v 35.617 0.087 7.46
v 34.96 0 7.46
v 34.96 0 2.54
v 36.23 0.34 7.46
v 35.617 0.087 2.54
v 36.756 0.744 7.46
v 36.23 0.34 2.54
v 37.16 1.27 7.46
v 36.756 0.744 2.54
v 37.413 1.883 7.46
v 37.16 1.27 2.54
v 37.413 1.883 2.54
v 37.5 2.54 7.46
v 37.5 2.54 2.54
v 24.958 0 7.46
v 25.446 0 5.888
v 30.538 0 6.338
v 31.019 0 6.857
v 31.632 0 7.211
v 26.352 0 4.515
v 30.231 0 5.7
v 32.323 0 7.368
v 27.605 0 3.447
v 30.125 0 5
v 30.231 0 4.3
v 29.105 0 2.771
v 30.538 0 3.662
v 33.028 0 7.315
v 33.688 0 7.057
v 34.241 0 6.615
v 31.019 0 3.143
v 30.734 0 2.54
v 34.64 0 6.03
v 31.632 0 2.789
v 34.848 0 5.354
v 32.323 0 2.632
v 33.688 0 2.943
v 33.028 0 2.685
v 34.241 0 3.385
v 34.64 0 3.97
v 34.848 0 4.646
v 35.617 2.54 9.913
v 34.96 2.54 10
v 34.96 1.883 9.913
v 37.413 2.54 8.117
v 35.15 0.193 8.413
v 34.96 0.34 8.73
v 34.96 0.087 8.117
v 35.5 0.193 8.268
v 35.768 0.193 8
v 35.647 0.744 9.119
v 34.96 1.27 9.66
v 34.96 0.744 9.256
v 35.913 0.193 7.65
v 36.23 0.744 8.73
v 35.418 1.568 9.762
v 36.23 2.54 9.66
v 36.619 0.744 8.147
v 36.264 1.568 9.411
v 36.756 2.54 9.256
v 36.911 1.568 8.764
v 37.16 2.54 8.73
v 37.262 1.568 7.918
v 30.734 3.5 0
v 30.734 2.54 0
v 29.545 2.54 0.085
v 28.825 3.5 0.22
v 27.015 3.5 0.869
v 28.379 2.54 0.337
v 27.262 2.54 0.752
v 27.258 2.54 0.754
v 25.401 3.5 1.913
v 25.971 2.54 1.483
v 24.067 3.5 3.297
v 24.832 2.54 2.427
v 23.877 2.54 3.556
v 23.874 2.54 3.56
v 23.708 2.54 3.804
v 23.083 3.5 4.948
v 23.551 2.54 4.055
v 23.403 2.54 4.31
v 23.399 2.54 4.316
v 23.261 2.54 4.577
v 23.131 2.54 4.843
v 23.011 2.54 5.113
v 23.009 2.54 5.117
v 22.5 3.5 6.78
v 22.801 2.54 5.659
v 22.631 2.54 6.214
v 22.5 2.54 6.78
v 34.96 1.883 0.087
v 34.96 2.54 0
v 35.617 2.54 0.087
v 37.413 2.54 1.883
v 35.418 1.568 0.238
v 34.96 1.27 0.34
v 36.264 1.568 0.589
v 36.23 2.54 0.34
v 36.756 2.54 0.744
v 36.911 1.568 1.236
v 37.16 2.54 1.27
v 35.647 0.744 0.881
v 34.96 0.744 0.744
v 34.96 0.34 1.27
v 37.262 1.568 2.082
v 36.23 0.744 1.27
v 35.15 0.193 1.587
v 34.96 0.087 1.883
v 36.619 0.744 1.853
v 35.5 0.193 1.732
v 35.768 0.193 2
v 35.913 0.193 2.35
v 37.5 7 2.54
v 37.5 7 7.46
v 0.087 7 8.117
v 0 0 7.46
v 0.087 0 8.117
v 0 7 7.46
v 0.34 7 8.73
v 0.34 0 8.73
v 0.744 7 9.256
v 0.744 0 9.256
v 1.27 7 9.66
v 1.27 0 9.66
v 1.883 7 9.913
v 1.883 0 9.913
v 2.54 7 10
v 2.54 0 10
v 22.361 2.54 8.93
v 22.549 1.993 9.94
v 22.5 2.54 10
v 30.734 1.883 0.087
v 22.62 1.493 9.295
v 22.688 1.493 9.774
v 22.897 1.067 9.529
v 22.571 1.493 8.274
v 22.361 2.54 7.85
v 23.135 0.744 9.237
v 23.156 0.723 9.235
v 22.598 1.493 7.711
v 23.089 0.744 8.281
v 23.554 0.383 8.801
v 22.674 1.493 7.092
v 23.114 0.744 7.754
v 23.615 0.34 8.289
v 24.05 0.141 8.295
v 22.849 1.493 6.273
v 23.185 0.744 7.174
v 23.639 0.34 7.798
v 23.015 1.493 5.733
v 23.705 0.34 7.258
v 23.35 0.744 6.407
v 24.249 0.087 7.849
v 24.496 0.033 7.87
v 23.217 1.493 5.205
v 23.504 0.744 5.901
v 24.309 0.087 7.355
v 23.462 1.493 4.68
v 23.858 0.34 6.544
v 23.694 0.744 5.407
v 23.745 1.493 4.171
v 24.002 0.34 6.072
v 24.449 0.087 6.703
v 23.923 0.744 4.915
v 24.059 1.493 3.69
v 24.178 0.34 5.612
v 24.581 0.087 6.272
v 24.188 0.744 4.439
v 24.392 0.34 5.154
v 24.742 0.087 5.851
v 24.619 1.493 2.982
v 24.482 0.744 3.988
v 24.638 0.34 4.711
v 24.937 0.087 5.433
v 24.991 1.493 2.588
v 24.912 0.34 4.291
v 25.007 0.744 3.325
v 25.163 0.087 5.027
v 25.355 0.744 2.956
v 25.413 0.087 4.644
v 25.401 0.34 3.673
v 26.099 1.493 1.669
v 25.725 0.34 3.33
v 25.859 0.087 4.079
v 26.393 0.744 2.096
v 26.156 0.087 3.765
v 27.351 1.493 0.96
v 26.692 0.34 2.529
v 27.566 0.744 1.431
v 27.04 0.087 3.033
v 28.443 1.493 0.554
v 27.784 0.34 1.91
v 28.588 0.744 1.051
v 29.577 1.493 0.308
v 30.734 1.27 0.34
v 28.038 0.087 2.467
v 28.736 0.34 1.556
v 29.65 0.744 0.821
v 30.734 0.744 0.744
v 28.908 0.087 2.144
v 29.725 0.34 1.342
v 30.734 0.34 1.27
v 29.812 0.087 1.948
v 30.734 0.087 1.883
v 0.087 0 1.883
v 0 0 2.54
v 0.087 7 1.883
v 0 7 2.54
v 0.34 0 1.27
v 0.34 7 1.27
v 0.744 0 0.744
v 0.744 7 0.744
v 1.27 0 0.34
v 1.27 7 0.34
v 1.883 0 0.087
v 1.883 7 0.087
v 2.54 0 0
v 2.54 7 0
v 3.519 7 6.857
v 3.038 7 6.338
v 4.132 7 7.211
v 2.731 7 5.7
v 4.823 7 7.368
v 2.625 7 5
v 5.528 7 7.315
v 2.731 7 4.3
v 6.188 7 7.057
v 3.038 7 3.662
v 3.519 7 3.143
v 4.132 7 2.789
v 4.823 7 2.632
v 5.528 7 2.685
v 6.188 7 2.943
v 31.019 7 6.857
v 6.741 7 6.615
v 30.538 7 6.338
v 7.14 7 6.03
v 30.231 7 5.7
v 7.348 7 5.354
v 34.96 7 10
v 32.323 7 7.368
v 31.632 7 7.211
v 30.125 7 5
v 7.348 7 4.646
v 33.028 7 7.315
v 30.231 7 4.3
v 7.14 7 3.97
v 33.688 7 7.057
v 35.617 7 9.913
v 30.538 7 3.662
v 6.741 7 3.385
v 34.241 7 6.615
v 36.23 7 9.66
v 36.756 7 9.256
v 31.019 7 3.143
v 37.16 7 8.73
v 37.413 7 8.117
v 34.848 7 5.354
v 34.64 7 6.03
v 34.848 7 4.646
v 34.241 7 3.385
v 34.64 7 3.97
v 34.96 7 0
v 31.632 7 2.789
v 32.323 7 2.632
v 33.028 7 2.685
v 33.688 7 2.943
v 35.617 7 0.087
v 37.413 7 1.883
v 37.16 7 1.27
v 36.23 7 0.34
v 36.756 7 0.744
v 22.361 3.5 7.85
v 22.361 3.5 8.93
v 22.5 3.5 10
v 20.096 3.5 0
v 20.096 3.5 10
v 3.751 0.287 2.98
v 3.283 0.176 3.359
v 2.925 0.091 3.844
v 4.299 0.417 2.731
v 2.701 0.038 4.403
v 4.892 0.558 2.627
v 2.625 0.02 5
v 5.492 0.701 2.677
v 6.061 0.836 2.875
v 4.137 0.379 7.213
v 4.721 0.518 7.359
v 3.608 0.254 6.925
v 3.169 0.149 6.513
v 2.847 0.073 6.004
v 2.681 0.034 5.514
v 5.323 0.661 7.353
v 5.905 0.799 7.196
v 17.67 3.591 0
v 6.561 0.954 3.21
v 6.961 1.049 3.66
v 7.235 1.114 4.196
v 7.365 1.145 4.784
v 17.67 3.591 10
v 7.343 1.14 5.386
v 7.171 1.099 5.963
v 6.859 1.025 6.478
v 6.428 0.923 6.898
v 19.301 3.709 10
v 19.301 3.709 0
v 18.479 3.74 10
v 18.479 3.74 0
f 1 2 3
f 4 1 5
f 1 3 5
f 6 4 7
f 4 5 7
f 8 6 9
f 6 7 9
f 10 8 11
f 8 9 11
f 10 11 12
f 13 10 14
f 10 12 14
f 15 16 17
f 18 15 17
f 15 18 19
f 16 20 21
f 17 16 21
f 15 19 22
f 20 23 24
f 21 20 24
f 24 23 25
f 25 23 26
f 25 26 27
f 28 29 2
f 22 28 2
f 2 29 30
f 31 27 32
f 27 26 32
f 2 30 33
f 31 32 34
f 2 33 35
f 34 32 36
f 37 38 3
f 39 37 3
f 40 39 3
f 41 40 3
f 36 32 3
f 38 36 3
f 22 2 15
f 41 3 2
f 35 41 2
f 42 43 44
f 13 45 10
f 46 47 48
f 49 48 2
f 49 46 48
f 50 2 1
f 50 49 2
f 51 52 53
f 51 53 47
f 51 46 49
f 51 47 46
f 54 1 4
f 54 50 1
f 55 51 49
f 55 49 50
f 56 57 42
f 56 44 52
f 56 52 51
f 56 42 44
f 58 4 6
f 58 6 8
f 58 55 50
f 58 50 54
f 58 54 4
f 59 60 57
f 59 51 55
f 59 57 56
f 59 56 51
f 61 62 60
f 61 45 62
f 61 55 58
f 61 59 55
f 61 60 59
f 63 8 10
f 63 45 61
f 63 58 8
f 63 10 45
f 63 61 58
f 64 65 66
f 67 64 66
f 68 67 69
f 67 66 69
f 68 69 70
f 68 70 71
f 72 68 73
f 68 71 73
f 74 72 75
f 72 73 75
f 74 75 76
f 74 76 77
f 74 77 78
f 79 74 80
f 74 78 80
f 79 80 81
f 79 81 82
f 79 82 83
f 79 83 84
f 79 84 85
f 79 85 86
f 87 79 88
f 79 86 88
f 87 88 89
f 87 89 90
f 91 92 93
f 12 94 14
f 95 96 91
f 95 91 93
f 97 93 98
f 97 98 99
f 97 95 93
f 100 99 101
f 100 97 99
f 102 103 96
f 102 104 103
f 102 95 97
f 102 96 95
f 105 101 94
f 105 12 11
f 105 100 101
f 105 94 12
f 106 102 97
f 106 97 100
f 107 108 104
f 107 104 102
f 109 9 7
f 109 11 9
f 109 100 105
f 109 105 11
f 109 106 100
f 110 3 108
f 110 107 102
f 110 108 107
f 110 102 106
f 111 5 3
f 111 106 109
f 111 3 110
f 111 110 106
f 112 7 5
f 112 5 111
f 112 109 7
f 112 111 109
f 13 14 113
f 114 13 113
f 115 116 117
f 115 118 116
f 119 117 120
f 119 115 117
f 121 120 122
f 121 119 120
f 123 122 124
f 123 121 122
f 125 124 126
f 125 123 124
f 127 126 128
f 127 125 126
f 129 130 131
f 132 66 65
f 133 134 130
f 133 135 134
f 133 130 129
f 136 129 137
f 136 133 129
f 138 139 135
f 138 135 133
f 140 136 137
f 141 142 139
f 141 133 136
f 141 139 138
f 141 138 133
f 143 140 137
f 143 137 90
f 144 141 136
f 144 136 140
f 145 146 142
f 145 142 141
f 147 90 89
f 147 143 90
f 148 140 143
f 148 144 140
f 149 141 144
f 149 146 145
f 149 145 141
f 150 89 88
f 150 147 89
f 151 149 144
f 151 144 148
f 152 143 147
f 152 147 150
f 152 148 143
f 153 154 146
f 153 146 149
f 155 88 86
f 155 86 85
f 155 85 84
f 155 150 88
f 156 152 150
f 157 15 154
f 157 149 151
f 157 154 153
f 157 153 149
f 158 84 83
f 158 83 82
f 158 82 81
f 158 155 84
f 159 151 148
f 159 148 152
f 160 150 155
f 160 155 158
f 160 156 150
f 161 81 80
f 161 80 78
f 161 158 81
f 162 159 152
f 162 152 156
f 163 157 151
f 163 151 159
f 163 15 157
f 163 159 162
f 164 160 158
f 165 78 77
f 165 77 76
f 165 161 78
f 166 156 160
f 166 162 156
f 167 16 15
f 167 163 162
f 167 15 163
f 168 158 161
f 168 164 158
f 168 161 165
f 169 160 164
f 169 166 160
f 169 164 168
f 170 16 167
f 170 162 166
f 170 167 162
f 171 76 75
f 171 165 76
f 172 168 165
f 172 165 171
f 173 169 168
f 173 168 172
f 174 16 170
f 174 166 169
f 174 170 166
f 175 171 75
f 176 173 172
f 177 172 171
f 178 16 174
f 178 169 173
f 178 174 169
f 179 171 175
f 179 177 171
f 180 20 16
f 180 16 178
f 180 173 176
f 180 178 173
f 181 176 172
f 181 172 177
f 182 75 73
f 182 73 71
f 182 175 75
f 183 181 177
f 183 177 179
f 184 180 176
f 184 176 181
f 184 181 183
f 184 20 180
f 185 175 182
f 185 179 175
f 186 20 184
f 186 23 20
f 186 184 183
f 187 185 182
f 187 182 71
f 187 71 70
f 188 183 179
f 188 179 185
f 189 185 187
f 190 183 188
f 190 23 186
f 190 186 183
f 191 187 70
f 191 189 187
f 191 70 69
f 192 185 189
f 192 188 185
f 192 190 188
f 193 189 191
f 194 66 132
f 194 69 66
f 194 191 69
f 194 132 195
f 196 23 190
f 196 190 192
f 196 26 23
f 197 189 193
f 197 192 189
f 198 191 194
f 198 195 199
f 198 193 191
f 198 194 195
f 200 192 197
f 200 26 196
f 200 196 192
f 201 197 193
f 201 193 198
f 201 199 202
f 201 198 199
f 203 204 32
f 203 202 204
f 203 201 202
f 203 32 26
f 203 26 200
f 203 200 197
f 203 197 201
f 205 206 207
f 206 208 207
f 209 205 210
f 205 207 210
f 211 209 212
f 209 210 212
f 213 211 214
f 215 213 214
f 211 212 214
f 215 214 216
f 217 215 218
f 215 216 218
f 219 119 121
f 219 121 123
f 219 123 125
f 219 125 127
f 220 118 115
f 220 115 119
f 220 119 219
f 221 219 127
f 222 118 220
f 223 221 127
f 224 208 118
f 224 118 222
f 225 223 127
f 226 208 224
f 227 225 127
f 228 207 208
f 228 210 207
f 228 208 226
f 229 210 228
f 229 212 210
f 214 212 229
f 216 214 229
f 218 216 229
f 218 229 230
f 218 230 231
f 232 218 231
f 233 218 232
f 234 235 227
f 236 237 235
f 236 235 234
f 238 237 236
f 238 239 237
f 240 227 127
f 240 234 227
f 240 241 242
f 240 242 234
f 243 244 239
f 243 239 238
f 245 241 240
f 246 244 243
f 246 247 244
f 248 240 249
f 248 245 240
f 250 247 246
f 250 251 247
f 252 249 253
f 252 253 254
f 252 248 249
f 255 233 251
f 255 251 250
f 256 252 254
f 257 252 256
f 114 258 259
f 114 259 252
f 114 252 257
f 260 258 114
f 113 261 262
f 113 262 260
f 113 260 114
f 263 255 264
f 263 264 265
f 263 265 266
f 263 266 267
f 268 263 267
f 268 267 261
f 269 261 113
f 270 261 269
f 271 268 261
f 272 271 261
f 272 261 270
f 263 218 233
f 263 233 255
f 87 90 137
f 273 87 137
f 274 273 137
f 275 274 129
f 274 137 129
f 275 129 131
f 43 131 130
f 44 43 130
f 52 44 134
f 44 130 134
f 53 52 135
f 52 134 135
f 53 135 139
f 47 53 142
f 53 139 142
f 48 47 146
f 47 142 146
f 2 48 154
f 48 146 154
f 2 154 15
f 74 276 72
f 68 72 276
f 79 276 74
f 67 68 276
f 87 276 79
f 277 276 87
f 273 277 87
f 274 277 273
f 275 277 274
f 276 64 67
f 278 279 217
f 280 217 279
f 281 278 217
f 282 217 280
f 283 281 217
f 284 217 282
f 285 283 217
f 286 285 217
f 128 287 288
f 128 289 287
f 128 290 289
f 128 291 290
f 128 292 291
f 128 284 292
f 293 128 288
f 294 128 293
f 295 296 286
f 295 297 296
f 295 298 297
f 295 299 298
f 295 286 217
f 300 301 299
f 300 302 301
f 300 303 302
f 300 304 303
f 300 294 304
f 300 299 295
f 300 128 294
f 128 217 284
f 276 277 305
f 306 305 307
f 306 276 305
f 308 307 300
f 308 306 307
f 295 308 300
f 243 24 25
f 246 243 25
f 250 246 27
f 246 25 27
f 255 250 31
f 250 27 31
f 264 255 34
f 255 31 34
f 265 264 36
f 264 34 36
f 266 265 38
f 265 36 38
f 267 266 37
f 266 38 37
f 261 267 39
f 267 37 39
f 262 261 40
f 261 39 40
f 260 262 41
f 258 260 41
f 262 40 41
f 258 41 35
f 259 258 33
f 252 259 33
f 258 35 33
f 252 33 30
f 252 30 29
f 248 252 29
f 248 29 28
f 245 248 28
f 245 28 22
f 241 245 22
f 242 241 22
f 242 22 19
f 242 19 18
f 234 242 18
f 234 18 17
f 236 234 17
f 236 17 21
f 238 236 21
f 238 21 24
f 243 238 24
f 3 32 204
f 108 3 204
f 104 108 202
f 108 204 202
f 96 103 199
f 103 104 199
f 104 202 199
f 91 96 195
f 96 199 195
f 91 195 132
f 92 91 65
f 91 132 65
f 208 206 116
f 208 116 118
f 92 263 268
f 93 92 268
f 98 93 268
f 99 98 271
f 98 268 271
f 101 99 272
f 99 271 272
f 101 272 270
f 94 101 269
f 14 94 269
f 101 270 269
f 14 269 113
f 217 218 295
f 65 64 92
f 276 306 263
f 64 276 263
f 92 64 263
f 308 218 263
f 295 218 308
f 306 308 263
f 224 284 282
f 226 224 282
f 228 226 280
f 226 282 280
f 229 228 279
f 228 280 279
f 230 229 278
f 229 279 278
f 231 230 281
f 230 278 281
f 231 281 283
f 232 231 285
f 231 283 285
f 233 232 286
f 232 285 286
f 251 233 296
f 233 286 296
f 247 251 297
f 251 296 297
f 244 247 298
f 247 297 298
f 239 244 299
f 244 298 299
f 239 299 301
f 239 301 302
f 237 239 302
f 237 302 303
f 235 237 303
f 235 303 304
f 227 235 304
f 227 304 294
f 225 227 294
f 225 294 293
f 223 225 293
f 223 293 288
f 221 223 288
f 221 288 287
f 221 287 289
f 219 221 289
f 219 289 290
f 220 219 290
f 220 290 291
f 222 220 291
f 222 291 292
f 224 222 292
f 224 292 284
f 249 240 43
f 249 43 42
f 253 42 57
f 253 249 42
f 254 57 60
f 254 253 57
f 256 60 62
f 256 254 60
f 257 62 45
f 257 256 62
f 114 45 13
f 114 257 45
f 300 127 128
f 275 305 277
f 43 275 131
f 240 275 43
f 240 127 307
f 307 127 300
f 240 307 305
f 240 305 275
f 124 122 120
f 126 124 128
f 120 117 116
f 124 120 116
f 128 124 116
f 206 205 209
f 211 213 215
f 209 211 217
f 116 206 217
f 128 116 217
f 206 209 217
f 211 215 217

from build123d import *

# Parameters (mm, degrees)
SKETCH1_W               = 37.5
SKETCH1_H               = 7
BOSS_EXTRUDE1_DEPTH     = 10
CUT_EXTRUDE1_DEPTH      = 40.436658073
CUT_EXTRUDE1_DEPTH_BACK = 40.436658073
SKETCH2_R               = 3.75
FILLET1_R               = 2.54
F_4_0MM_DOWEL_HOLE1_D   = 4.75
CUT_EXTRUDE2_DEPTH      = 40.436658073
CUT_EXTRUDE2_DEPTH_BACK = 40.436658073
CUT_EXTRUDE3_DEPTH      = 3.5
FILLET2_R               = 2.54


with BuildPart() as part:
    # Sketch1 → Boss-Extrude1 (new body)
    with BuildSketch(Plane.XY):
        with Locations((18.75, 3.5)):
            Rectangle(SKETCH1_W, SKETCH1_H)
    extrude(amount=BOSS_EXTRUDE1_DEPTH)

    # Sketch2 → Cut-Extrude1 (cut, two sides: drawn at the far end of the back side and taken through both)
    with BuildSketch(Plane.XY.offset(10).offset(-CUT_EXTRUDE1_DEPTH_BACK)):
        with Locations((18.75, 0)):
            Circle(SKETCH2_R)
    extrude(amount=CUT_EXTRUDE1_DEPTH + CUT_EXTRUDE1_DEPTH_BACK, mode=Mode.SUBTRACT)

    # Fillet1
    fillet1_edges = [part.edges().sort_by_distance(p)[0] for p in [
        (37.5, 3.5, 10),
        (0, 3.5, 10),
        (37.5, 3.5, 0),
        (0, 3.5, 0),
    ]]
    fillet(fillet1_edges, radius=FILLET1_R)

    # Ø4.0mm Dowel Hole1 (through all)
    with Locations(Plane(origin=(0, 7, 0), x_dir=(1, 0, 0), z_dir=(0, 1, 0))):
        with Locations((5, -5), (32.5, -5)):
            Hole(F_4_0MM_DOWEL_HOLE1_D / 2)

    # Sketch6 → Cut-Extrude2 (cut, two sides: drawn at the far end of the back side and taken through both)
    with BuildSketch(Plane(origin=(0, 0, 0), x_dir=(-1, 0, 0), z_dir=(0, 0, -1)).offset(-CUT_EXTRUDE2_DEPTH_BACK)):
        Polygon((-2.54, 0), (-18.100943668, 3.693403021), (-18.100943668, 0), align=None)
    extrude(amount=CUT_EXTRUDE2_DEPTH + CUT_EXTRUDE2_DEPTH_BACK, mode=Mode.SUBTRACT)

    # Sketch7 → Cut-Extrude3 (cut)
    with BuildSketch(Plane.XZ):
        with BuildLine():
            Line((22.5, 6.78008281), (22.5, 0))
            Line((22.5, 0), (30.734125825, 0))
            ThreePointArc((30.734125825, 0), (25.400966559, 1.913143457), (22.5, 6.78008281))
        make_face()
        with BuildLine():
            Line((22.5, 10), (20.085032716, 10))
            Line((20.085032716, 10), (20.085032716, 0))
            Line((20.085032716, 0), (22.5, 0))
            Line((22.5, 0), (22.5, 6.78008281))
            ThreePointArc((22.5, 6.78008281), (22.34408442, 8.390041405), (22.5, 10))
        make_face()
    extrude(amount=-CUT_EXTRUDE3_DEPTH, mode=Mode.SUBTRACT)

    # Fillet2
    # the kernel refuses this fillet: 2.54 mm, written as the material it takes off along each edge
    with BuildSketch(Plane(origin=(16.15, 0, 10), x_dir=(0, 1, 0), z_dir=(1, 0, 0))) as fillet2_piece_1:
        with BuildLine():
            CenterArc((FILLET2_R, -FILLET2_R), FILLET2_R, 90, 90)
            Line((0, -FILLET2_R), (0, 0))
            Line((0, 0), (FILLET2_R, 0))
        make_face()
    extrude(amount=18.81, mode=Mode.SUBTRACT)
    with BuildSketch(Plane(origin=(34.96, 0, 7.46), x_dir=(0, 0, 1), z_dir=(-1, 0, 0))) as fillet2_piece_2:
        with BuildLine():
            CenterArc((2.54 - FILLET2_R, FILLET2_R), FILLET2_R, 270, 90)
            Line((2.54 - FILLET2_R, 0), (2.54, 0))
            Line((2.54, 0), (2.54, FILLET2_R))
        make_face()
    revolve(axis=Axis((34.96, 0, 7.46), (0, 1, 0)), revolution_arc=90, mode=Mode.SUBTRACT)
    with BuildSketch(Plane(origin=(37.5, 0, 2.54), x_dir=(-1, 0, 0), z_dir=(0, 0, 1))) as fillet2_piece_3:
        with BuildLine():
            CenterArc((FILLET2_R, -FILLET2_R), FILLET2_R, 90, 90)
            Line((0, -FILLET2_R), (0, 0))
            Line((0, 0), (FILLET2_R, 0))
        make_face()
    extrude(amount=4.92, mode=Mode.SUBTRACT)
    with BuildSketch(Plane(origin=(34.96, 0, 2.54), x_dir=(0, 0, -1), z_dir=(-1, 0, 0))) as fillet2_piece_4:
        with BuildLine():
            CenterArc((2.54 - FILLET2_R, -FILLET2_R), FILLET2_R, 0, 90)
            Line((2.54, -FILLET2_R), (2.54, 0))
            Line((2.54, 0), (2.54 - FILLET2_R, 0))
        make_face()
    revolve(axis=Axis((34.96, 0, 2.54), (0, -1, 0)), revolution_arc=90, mode=Mode.SUBTRACT)
    with BuildSketch(Plane(origin=(30.734125825, 0, 0), x_dir=(0, 1, 0), z_dir=(1, 0, 0))) as fillet2_piece_5:
        with BuildLine():
            CenterArc((FILLET2_R, FILLET2_R), FILLET2_R, 180, 90)
            Line((0, FILLET2_R), (0, 0))
            Line((0, 0), (FILLET2_R, 0))
        make_face()
    extrude(amount=4.225874175, mode=Mode.SUBTRACT)
    with BuildSketch(Plane(origin=(30.734125825, 0, 8.390041405), x_dir=(-0.8451253375205291, 0, 0.5345682032077963), z_dir=(0.5345682032077963, 0, 0.8451253375205291))) as fillet2_piece_6:
        with BuildLine():
            CenterArc((8.390041405 - FILLET2_R, -FILLET2_R), FILLET2_R, 0, 90)
            Line((8.390041405, -FILLET2_R), (8.390041405, 0))
            Line((8.390041405, 0), (8.390041405 - FILLET2_R, 0))
        make_face()
    revolve(axis=Axis((30.734125825, 0, 8.390041405), (0, -1, 0)), revolution_arc=122.314632757, mode=Mode.SUBTRACT)


solid = part.part
